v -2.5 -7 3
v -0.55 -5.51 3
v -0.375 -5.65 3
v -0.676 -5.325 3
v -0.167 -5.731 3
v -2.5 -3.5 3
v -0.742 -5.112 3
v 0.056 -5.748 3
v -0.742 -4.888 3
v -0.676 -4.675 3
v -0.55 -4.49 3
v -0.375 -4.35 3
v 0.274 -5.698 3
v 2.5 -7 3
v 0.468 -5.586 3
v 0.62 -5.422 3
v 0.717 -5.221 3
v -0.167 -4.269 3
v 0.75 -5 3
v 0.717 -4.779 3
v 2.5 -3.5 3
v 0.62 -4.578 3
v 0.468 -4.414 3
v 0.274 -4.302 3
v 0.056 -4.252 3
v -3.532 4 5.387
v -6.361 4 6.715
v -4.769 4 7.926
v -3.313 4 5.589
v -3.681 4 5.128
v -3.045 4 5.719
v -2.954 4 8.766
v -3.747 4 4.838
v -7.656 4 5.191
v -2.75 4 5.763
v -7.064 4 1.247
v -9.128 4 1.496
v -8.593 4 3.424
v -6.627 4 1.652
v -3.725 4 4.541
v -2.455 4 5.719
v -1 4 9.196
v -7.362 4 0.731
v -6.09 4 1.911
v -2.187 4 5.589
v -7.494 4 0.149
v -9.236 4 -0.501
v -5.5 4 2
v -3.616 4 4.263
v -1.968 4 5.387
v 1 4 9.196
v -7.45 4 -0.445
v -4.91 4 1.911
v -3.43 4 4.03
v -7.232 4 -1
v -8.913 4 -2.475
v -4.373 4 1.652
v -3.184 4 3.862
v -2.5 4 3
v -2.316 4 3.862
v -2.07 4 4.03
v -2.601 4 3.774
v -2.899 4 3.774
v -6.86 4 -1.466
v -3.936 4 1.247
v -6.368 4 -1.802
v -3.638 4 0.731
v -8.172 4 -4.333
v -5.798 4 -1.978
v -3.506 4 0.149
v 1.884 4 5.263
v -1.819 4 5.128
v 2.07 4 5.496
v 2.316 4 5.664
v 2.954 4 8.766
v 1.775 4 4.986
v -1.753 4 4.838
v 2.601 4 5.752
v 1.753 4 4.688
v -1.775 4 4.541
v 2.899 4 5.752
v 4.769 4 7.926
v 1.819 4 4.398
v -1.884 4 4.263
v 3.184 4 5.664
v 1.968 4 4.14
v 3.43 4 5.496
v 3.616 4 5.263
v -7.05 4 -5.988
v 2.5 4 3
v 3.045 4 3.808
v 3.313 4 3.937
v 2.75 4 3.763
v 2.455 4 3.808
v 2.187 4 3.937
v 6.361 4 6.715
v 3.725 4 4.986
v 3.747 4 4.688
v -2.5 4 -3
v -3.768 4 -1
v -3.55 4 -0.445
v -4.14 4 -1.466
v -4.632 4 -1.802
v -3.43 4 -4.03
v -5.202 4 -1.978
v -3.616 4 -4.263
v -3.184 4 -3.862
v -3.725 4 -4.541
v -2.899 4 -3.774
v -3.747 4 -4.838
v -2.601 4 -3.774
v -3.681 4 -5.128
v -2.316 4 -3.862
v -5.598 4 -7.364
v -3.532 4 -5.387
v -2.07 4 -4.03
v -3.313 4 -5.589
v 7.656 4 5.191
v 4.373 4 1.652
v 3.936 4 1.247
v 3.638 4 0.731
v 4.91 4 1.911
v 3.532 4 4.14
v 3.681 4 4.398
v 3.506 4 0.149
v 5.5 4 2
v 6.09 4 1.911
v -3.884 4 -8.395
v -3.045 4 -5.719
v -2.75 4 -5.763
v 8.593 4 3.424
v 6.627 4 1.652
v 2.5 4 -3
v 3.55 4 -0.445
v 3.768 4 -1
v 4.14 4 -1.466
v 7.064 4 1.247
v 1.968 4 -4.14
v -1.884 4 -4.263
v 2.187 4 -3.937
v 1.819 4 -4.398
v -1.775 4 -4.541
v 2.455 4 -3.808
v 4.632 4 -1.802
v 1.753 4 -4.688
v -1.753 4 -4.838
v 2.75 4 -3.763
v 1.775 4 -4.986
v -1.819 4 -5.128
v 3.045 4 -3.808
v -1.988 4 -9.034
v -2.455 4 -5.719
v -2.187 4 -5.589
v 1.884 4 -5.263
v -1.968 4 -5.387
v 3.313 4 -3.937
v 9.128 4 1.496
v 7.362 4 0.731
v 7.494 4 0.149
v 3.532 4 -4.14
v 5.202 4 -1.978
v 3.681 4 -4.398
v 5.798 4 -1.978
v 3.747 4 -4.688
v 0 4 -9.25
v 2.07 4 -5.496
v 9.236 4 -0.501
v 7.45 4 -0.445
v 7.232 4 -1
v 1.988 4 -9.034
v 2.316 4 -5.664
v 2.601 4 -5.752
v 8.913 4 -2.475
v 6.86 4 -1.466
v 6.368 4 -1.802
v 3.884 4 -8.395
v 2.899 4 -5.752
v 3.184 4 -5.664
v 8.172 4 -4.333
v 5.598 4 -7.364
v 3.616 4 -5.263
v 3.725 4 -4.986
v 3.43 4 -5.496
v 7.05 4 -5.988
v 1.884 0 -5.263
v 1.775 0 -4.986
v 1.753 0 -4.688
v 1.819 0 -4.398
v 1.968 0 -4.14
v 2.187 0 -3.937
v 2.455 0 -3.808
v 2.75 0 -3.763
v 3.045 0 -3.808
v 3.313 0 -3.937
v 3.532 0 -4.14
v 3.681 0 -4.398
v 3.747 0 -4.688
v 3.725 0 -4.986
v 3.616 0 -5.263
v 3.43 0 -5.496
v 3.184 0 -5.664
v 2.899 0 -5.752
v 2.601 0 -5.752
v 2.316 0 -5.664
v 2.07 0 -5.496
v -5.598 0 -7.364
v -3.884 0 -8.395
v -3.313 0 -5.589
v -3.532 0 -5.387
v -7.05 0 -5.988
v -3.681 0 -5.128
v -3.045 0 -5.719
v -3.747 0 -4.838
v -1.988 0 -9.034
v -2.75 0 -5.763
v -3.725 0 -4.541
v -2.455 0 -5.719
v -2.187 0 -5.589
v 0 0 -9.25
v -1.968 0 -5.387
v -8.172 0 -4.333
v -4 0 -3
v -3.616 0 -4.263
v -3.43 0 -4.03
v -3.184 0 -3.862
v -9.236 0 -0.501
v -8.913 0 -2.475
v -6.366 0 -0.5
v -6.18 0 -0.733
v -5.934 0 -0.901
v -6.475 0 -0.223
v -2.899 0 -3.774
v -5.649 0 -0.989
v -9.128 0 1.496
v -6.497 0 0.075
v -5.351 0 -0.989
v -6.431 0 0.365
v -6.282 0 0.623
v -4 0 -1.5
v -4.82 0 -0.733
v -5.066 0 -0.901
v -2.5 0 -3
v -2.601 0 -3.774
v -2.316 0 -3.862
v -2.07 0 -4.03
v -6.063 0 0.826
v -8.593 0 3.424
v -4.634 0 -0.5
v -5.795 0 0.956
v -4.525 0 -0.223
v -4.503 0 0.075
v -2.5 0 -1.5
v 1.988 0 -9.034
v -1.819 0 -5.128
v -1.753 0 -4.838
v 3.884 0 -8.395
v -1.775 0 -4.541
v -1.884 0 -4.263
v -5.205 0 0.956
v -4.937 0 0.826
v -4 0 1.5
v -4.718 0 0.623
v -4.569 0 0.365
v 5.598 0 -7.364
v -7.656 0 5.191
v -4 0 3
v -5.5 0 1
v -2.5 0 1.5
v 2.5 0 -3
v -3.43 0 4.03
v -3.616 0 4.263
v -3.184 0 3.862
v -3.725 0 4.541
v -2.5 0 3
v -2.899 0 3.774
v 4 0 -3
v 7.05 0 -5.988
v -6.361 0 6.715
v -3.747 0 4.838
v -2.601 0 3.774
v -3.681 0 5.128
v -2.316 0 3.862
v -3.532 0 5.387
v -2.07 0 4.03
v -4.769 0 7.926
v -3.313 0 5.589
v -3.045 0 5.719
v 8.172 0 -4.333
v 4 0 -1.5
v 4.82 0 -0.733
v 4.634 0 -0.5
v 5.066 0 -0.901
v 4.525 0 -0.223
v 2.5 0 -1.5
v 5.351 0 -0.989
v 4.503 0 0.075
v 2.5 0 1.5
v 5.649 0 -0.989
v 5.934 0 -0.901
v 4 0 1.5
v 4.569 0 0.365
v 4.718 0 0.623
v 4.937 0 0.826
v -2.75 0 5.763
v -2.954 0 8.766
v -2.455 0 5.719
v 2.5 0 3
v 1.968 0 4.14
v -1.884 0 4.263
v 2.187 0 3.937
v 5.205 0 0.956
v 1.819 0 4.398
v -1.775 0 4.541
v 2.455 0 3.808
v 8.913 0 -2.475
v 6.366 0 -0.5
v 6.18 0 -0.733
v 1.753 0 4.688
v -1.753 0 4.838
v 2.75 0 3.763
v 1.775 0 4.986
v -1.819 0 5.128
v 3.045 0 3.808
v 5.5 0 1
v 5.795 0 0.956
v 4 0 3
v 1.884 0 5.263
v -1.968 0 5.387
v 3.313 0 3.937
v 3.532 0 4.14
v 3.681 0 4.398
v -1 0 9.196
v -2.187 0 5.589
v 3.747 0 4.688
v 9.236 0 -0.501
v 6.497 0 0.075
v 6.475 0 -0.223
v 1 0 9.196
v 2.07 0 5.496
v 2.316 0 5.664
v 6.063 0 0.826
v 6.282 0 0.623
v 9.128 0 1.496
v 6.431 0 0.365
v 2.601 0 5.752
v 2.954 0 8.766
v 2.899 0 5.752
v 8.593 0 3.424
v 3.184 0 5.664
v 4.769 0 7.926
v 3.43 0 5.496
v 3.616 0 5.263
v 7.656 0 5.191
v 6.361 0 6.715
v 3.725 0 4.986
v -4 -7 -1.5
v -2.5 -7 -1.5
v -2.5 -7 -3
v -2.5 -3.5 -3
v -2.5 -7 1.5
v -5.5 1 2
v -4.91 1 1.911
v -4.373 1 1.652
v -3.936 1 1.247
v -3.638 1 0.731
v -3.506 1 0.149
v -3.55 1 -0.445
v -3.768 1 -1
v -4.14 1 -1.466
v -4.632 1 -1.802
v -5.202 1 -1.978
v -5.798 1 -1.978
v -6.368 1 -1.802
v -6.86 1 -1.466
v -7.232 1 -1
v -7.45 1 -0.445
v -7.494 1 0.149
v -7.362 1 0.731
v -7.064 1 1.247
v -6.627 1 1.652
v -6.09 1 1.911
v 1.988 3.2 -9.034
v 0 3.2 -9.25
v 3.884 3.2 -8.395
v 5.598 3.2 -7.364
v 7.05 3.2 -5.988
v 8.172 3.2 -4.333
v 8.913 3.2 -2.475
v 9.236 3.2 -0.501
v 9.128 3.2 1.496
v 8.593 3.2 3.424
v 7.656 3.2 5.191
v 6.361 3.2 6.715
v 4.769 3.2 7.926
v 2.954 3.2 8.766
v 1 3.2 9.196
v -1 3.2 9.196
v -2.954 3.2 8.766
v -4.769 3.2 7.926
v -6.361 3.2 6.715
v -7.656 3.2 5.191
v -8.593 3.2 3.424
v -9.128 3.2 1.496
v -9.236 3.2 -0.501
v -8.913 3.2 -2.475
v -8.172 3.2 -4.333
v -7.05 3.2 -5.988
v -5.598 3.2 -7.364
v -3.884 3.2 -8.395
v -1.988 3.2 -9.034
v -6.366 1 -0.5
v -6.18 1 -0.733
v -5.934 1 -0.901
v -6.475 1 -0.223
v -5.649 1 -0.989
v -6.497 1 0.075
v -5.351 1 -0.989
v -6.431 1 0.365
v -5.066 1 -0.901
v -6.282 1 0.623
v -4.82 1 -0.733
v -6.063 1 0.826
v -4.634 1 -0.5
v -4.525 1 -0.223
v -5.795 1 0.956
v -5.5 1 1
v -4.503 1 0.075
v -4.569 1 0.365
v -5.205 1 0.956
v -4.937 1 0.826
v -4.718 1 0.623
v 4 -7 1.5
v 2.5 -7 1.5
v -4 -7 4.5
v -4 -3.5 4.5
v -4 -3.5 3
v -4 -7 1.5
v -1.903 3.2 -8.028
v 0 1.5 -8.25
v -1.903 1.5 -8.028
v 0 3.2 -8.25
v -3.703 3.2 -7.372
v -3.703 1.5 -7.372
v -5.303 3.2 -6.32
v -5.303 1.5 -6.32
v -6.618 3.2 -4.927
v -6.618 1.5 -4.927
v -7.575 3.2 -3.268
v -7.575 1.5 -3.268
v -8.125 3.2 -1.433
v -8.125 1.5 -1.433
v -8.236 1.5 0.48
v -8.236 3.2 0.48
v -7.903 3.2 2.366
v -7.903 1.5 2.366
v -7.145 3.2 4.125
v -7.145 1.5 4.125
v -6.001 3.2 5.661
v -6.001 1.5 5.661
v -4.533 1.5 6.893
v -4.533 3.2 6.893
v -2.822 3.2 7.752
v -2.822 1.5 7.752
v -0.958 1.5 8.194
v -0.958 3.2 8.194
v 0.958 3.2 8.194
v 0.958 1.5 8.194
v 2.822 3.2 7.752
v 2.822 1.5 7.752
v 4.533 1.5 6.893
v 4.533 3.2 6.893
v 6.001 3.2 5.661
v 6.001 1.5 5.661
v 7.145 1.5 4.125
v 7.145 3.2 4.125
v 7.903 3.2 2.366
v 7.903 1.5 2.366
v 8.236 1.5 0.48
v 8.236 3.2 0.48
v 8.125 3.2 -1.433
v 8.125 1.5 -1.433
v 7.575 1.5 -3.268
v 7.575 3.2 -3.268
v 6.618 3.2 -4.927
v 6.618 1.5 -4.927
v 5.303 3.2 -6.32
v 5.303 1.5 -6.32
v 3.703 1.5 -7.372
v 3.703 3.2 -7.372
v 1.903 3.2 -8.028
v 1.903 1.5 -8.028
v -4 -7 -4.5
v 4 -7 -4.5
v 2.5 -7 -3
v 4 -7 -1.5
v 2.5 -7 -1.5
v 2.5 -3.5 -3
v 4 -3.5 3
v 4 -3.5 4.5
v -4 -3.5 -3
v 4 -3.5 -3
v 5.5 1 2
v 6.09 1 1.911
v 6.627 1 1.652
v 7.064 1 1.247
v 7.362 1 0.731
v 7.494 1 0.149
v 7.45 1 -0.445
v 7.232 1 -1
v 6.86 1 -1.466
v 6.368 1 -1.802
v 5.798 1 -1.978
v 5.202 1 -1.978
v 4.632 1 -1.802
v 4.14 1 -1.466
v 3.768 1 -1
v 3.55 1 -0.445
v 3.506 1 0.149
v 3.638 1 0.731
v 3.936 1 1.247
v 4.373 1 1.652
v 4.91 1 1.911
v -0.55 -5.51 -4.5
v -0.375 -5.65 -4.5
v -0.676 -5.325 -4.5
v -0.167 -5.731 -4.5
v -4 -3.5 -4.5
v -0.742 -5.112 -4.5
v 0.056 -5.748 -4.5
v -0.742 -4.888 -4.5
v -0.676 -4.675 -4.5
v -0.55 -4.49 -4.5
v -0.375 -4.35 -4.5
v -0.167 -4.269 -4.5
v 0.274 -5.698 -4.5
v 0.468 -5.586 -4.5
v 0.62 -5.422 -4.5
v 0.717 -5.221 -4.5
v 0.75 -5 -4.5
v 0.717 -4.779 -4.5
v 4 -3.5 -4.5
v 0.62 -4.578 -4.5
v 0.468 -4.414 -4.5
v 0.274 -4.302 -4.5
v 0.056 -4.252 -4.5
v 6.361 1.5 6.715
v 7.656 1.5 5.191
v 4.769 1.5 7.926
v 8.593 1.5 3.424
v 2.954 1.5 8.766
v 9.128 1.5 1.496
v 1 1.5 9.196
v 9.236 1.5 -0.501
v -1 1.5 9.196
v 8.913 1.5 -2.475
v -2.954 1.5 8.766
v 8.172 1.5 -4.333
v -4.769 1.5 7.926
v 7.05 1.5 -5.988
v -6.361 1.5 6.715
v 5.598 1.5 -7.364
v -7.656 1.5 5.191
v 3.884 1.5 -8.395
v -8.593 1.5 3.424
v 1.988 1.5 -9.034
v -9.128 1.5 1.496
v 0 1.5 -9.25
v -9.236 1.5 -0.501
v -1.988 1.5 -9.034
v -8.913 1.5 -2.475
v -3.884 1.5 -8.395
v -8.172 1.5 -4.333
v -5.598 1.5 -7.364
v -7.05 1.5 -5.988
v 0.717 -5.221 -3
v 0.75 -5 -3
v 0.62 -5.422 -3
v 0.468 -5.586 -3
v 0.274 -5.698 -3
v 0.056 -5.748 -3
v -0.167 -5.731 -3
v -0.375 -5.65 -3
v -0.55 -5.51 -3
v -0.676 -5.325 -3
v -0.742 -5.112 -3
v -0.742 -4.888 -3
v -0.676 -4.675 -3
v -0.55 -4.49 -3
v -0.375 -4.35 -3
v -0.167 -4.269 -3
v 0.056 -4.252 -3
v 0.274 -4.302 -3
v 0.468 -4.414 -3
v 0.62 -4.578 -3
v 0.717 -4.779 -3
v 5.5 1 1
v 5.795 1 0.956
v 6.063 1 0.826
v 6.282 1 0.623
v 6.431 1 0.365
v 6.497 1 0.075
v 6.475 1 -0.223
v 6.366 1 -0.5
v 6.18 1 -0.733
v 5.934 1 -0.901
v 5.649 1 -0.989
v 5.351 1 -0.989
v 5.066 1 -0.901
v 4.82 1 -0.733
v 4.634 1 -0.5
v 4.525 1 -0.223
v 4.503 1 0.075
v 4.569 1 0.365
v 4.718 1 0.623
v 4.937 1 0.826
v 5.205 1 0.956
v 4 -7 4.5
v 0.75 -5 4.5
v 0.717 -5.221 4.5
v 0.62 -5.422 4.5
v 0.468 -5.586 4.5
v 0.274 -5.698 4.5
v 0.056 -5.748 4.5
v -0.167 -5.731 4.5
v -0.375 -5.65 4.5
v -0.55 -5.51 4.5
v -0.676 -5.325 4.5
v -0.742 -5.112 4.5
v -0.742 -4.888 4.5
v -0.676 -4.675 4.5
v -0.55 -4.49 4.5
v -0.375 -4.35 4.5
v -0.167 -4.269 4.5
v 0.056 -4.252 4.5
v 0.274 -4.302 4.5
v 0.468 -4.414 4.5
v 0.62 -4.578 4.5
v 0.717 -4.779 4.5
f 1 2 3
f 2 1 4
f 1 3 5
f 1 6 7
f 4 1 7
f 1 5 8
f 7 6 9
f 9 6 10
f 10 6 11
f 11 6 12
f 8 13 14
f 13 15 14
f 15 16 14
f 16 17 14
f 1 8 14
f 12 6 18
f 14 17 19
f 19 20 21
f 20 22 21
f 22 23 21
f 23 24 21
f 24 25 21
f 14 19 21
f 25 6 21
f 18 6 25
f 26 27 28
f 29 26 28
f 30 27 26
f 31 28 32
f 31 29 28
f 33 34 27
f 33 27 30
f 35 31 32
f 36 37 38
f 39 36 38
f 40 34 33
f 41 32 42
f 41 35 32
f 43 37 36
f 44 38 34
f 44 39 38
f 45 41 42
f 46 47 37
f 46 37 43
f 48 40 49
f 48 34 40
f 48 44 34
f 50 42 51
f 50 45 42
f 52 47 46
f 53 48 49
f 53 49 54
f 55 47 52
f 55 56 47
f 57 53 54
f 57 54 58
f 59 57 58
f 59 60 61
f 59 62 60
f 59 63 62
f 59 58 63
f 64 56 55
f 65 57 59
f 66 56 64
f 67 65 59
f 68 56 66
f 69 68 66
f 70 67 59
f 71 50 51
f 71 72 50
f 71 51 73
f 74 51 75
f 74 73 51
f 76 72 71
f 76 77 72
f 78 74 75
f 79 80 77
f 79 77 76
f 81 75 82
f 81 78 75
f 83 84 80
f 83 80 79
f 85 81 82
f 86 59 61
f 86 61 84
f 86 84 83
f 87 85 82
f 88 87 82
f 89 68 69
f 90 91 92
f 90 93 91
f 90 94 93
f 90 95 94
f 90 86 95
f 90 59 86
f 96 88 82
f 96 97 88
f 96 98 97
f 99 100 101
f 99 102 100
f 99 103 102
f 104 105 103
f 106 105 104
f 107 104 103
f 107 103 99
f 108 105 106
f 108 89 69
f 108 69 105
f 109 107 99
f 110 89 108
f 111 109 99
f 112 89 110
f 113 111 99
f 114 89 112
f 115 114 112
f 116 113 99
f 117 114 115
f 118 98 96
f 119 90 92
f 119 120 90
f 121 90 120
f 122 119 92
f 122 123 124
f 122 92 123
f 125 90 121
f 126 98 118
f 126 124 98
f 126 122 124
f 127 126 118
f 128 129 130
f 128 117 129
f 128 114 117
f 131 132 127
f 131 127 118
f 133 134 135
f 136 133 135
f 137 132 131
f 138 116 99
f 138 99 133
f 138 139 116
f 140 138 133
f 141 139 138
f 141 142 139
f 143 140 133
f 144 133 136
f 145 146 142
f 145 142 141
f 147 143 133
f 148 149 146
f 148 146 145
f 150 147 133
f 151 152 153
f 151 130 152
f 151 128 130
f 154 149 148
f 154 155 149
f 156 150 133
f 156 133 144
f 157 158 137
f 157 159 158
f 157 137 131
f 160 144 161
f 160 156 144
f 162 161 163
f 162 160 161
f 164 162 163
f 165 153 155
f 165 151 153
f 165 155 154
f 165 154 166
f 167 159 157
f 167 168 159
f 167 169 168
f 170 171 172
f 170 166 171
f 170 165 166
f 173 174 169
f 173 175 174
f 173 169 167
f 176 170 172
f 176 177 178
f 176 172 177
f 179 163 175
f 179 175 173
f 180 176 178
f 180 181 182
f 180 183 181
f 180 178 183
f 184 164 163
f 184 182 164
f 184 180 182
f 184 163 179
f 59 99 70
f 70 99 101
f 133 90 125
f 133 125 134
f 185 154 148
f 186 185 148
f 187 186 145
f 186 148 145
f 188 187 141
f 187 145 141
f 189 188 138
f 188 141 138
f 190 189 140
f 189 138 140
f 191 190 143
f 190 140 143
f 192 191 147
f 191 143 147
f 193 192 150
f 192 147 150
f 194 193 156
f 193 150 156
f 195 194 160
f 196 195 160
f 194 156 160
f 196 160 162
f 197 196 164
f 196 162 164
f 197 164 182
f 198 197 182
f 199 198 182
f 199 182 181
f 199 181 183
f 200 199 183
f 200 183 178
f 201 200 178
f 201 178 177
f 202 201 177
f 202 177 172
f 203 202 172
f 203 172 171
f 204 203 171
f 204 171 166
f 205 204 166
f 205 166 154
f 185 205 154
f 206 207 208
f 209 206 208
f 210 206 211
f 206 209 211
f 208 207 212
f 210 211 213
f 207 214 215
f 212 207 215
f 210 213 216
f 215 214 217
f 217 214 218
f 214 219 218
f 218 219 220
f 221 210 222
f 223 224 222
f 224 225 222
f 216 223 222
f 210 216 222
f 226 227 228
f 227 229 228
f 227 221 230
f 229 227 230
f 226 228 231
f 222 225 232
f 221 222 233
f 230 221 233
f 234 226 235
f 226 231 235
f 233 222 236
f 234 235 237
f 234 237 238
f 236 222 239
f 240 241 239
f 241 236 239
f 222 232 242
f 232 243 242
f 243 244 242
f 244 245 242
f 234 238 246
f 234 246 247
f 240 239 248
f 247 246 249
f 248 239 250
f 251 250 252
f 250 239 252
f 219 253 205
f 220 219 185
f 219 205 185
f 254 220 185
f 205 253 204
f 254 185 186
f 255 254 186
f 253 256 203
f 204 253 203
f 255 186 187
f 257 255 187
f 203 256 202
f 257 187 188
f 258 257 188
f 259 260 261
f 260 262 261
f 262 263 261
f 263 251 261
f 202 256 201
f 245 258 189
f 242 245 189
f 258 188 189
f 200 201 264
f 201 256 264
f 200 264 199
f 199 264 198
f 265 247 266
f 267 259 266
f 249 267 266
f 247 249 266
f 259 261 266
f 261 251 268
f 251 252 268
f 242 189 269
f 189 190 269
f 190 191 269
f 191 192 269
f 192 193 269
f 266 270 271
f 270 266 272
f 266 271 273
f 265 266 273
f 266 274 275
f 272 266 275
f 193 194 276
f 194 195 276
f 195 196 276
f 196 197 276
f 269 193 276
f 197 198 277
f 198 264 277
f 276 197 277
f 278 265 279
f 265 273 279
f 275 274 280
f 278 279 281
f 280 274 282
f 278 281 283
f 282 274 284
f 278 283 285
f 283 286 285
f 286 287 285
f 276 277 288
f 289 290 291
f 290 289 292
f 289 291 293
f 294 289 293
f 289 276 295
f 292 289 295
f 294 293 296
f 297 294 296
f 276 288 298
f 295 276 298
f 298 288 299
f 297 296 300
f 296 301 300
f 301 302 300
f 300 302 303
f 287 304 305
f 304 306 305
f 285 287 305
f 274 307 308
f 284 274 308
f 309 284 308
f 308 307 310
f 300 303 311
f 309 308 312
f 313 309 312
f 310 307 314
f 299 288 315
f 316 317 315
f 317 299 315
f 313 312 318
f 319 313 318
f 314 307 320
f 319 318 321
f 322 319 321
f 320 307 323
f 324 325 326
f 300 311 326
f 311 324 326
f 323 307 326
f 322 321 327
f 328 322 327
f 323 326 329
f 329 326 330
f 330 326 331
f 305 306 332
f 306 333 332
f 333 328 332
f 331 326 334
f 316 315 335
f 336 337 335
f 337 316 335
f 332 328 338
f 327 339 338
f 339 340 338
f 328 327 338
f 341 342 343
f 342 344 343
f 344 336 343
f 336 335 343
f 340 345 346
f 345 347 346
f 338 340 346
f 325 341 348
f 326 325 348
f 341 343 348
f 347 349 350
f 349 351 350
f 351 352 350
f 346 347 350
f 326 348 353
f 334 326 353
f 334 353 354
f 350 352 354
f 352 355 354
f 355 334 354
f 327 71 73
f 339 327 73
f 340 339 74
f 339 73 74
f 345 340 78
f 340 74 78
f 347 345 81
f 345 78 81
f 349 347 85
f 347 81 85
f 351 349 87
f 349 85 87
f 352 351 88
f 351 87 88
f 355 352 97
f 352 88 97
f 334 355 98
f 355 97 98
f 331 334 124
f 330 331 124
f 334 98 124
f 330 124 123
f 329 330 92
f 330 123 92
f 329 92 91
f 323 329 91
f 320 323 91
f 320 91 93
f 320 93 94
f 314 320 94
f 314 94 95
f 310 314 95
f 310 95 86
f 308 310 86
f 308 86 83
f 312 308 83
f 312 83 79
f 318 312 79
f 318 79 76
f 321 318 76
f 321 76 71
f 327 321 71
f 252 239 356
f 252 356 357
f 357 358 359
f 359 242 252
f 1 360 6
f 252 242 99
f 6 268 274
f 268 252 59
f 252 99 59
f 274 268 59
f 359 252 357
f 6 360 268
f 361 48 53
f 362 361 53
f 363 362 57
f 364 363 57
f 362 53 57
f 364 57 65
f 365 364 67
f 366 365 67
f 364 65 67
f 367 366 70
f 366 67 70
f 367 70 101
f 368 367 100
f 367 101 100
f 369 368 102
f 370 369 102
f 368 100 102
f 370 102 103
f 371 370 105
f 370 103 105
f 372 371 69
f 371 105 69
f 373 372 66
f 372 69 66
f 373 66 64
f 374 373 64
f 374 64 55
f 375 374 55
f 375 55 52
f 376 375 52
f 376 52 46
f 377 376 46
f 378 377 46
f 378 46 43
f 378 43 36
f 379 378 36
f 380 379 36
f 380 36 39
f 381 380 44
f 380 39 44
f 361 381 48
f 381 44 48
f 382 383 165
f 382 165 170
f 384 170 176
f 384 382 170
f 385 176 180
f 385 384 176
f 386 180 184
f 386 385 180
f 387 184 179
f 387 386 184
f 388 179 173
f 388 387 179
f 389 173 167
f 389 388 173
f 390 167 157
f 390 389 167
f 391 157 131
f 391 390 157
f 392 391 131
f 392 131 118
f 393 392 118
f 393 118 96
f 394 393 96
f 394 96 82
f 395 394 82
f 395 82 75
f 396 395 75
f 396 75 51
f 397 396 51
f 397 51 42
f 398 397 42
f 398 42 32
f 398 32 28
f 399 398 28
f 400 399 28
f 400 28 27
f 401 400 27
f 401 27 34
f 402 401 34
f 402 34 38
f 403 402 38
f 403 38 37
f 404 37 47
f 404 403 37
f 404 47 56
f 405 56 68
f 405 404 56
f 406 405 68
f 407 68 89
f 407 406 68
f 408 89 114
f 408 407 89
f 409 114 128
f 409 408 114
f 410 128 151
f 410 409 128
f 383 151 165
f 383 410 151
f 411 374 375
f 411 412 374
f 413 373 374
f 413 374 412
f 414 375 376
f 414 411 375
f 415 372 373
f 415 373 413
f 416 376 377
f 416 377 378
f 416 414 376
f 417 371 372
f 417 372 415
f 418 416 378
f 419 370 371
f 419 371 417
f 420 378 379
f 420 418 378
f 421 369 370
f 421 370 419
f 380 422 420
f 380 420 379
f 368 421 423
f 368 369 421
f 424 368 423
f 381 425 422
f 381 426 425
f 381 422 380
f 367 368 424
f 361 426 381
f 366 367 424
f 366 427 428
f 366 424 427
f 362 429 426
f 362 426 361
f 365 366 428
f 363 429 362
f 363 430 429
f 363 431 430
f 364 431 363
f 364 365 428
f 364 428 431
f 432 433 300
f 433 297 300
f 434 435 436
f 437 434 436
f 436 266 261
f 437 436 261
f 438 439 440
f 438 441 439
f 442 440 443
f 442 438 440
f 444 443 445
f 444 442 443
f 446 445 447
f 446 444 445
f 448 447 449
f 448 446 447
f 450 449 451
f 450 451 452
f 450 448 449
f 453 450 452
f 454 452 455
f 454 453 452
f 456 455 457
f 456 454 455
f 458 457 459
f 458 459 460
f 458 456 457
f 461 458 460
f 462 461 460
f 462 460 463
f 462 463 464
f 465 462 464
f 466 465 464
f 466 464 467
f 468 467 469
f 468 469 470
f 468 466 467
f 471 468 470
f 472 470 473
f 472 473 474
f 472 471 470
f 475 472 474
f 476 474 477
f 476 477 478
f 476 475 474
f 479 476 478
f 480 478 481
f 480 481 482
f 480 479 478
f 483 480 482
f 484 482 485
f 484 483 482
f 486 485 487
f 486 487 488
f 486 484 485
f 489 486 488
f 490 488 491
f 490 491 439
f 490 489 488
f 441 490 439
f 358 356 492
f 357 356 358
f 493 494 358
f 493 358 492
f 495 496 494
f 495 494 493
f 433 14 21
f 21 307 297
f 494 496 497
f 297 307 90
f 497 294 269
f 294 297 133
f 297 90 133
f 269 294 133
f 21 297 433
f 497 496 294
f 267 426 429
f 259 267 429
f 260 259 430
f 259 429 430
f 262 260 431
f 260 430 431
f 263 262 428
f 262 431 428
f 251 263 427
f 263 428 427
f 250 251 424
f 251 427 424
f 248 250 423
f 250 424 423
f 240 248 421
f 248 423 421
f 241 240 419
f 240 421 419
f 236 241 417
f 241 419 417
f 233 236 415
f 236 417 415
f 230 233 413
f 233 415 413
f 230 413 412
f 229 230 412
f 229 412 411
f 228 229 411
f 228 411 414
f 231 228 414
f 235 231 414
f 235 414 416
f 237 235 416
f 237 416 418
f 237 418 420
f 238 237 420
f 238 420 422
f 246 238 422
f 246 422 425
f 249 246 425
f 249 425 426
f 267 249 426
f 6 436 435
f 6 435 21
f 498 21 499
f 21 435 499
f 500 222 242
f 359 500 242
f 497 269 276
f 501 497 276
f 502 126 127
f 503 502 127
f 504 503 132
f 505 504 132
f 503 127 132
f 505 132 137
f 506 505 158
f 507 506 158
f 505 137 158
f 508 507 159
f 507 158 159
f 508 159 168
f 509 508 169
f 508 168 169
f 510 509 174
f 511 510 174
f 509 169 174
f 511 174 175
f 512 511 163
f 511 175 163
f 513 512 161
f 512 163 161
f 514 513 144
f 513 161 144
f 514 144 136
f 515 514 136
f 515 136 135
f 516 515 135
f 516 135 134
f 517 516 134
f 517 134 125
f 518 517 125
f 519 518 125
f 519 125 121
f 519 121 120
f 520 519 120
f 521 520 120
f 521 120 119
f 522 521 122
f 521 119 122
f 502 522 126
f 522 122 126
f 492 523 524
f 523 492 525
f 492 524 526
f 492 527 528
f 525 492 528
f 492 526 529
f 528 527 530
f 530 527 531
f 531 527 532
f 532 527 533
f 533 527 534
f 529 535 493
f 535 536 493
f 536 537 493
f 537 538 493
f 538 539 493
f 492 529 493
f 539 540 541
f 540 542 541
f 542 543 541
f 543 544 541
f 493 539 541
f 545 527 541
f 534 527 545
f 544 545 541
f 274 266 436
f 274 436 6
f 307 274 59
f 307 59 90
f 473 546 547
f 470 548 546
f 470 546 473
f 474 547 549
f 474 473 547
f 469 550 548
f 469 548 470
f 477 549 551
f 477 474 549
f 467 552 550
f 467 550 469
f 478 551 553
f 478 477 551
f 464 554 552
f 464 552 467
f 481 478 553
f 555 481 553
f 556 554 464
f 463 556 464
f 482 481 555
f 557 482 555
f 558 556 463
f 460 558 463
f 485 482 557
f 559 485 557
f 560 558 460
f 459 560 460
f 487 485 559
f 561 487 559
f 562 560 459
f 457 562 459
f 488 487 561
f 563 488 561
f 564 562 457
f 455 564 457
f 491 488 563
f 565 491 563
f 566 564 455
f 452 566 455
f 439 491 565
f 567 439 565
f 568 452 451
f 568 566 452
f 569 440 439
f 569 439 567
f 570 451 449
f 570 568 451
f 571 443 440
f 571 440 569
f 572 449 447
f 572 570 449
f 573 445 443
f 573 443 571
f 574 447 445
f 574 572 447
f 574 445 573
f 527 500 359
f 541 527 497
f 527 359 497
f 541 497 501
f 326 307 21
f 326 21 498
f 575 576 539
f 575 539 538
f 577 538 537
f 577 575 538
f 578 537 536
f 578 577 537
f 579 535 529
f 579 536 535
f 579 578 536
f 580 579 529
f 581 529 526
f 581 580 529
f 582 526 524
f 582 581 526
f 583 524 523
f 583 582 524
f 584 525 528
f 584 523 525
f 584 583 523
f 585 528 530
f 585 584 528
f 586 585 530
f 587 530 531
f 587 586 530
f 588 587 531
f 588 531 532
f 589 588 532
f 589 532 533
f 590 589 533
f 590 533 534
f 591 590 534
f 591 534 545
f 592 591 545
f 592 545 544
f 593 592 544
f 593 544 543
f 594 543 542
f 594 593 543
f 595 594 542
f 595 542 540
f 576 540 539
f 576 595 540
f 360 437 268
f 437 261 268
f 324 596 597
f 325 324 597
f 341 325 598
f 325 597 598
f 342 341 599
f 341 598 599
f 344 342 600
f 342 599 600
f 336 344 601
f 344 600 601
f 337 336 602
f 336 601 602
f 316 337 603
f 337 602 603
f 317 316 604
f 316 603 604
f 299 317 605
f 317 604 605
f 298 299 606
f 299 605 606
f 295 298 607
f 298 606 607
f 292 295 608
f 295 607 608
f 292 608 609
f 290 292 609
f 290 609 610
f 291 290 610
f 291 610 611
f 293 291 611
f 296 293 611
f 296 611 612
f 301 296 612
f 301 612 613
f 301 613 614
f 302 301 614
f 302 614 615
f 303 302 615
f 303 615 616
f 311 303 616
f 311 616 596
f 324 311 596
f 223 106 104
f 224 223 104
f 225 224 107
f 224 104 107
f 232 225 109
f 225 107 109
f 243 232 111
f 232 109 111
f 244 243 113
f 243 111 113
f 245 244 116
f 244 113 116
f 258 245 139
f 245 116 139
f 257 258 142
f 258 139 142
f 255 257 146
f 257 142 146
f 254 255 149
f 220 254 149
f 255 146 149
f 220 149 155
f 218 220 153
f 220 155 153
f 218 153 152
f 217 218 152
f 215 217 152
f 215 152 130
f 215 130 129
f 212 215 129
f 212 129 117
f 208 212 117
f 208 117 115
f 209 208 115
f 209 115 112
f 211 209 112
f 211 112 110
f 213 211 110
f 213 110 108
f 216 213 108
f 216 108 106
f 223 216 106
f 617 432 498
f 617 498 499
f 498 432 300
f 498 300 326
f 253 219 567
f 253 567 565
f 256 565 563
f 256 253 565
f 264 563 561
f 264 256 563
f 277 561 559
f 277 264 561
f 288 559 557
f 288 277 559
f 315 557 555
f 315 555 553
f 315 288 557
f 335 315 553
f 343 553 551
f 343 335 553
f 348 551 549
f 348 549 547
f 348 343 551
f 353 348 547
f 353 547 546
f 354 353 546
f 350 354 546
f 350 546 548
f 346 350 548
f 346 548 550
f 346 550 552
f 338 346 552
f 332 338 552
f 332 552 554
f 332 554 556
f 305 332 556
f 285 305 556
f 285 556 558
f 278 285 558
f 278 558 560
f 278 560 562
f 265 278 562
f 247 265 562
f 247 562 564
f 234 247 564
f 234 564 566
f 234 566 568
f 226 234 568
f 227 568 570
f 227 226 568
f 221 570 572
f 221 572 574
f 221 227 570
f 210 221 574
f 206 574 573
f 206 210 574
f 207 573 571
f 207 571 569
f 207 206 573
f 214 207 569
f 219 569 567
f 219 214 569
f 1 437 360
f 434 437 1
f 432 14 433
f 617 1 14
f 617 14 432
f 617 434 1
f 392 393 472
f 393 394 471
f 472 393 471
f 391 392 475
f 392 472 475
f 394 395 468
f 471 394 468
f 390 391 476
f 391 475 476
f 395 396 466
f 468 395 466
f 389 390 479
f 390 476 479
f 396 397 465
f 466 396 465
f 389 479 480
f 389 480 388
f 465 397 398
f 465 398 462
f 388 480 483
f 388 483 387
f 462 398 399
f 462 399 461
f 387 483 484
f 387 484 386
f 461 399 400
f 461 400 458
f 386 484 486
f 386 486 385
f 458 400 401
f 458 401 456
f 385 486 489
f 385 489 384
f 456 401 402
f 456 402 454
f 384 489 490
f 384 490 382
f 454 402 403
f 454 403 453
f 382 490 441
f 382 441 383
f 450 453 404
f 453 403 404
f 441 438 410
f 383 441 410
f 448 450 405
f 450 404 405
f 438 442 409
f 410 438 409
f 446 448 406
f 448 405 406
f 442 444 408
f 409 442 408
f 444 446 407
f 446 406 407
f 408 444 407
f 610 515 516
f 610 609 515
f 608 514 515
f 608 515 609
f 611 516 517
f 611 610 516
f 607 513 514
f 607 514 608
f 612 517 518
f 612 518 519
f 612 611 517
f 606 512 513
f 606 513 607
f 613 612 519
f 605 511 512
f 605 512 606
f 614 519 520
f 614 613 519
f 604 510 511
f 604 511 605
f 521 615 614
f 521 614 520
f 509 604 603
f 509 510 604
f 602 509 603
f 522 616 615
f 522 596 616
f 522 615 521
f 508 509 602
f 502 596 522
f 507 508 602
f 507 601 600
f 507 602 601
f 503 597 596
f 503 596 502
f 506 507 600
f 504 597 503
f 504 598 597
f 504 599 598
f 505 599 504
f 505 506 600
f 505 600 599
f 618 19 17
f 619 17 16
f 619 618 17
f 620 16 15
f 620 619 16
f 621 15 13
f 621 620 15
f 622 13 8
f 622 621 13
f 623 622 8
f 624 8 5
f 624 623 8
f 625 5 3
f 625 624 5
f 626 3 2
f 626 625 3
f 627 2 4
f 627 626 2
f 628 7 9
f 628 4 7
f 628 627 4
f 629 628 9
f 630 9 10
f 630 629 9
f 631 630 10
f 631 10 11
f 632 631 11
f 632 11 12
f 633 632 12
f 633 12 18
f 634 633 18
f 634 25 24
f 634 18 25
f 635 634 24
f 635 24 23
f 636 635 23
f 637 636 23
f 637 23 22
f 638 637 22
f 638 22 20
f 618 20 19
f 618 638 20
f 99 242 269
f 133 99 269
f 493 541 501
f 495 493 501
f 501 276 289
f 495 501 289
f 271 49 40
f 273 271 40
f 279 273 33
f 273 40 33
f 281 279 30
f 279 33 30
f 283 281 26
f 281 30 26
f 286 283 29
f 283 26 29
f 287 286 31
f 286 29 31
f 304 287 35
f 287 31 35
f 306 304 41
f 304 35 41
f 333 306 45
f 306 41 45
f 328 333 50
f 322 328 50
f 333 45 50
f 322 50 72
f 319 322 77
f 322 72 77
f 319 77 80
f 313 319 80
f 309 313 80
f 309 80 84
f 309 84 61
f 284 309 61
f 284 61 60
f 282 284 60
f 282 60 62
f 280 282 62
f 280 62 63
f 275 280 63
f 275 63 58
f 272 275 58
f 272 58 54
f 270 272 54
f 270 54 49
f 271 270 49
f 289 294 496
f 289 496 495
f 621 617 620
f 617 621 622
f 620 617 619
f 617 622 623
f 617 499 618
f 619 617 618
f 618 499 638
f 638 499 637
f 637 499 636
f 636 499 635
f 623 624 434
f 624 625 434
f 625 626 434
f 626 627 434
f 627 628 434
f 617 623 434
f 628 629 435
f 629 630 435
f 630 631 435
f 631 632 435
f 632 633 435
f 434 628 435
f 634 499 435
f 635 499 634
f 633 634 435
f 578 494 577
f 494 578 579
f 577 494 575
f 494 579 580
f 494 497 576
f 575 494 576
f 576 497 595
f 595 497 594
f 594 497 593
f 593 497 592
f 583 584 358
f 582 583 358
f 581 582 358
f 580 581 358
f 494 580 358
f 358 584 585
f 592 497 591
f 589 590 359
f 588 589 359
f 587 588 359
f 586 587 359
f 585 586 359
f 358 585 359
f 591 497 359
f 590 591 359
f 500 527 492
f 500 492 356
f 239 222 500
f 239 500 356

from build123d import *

# Parameters (mm, degrees)
SKETCH_1_R               = 11
EXTRUDE_1_DEPTH          = 9
SKETCH_2_R               = 1
CUT_EXTRUDE_1_DEPTH      = 10
SKETCH_3_R               = 16.549134696
SKETCH_3_R_2             = 9.25
CUT_EXTRUDE_2_DEPTH      = 7
SKETCH_4_W               = 2
SKETCH_4_H               = 1.7
SKETCH_5_W               = 5
SKETCH_5_H               = 6
CUT_EXTRUDE_3_DEPTH      = 7
SKETCH_6_R               = 1.4
CUT_EXTRUDE_4_DEPTH      = 7
PATTERN_CIRCULAR_1_COUNT = 3
PATTERN_CIRCULAR_1_ANGLE = 120
SKETCH_10_R              = 17.755262973
CUT_EXTRUDE_8_DEPTH      = 5
SKETCH_11_R              = 2
CUT_EXTRUDE_9_DEPTH      = 3
SKETCH_12_W              = 1.5
SKETCH_12_H              = 1.5
EXTRUDE_2_DEPTH          = 3.5
SKETCH_14_W              = 1.5
SKETCH_14_H              = 1.5
EXTRUDE_3_DEPTH          = 3.5
SKETCH_13_R              = 0.75
CUT_EXTRUDE_11_DEPTH     = 18.989580318


with BuildPart() as part:
    # 草图1 → 凸台-拉伸1 (new body)
    with BuildSketch(Plane(origin=(0, 0, 0), x_dir=(1, 0, 0), z_dir=(0, 1, 0))):
        with Locations(Location((0, 0, 0), (0, 0, 270))):
            Circle(SKETCH_1_R)
    extrude(amount=EXTRUDE_1_DEPTH)

    # 草图2 → 切除-拉伸1 (cut)
    with BuildSketch(Plane(origin=(0, 9, 0), x_dir=(1, 0, 0), z_dir=(0, 1, 0))):
        with Locations(Location((-5.5, 0, 0), (0, 0, 270))):
            Circle(SKETCH_2_R)
        with Locations(Location((5.5, 0, 0), (0, 0, 270))):
            Circle(SKETCH_2_R)
    cut_extrude_1 = extrude(amount=-CUT_EXTRUDE_1_DEPTH, mode=Mode.SUBTRACT)

    # 草图3 → 切除-拉伸2 (cut)
    with BuildSketch(Plane.XZ):
        Circle(SKETCH_3_R)
        with Locations(Location((0, 0, 0), (0, 0, 270))):
            Circle(SKETCH_3_R_2, mode=Mode.SUBTRACT)
    extrude(amount=-CUT_EXTRUDE_2_DEPTH, mode=Mode.SUBTRACT)

    # 草图4 → 切除-旋转1 (revolve, cut)
    with BuildSketch(Plane.XY, mode=Mode.PRIVATE) as cut_revolve_1_sk:
        with Locations((-9.25, 5.45)):
            Rectangle(SKETCH_4_W, SKETCH_4_H)
        with Locations((-9.25, 2.35)):
            Rectangle(SKETCH_4_W, SKETCH_4_H)
    revolve(cut_revolve_1_sk.sketch.rotate(Axis((0, 0, 0), (0, 1, 0)), 270), axis=Axis((0, 0, 0), (0, 1, 0)), mode=Mode.SUBTRACT)

    # 草图5 → 切除-拉伸3 (cut)
    with BuildSketch(Plane.XZ):
        Rectangle(SKETCH_5_W, SKETCH_5_H)
    extrude(amount=-CUT_EXTRUDE_3_DEPTH, mode=Mode.SUBTRACT)

    # 草图6 → 切除-拉伸4 (cut)
    with BuildSketch(Plane(origin=(0, 9, 0), x_dir=(1, 0, 0), z_dir=(0, 1, 0))):
        with Locations(Location((0, 0, 0), (0, 0, 270))):
            Circle(SKETCH_6_R)
    extrude(amount=-CUT_EXTRUDE_4_DEPTH, mode=Mode.SUBTRACT)

    # 阵列(圆周)1: 切除-拉伸1 ×3 about axis
    pattern_circular_1_axis = Axis((0, 0, 0), (0, -1, 0))
    for i in range(1, PATTERN_CIRCULAR_1_COUNT):
        add(cut_extrude_1.rotate(pattern_circular_1_axis, i * PATTERN_CIRCULAR_1_ANGLE / (PATTERN_CIRCULAR_1_COUNT - 1)), mode=Mode.SUBTRACT)

    # 草图10 → 切除-拉伸8 (cut)
    with BuildSketch(Plane(origin=(0, 9, 0), x_dir=(1, 0, 0), z_dir=(0, 1, 0))):
        Circle(SKETCH_10_R)
    extrude(amount=-CUT_EXTRUDE_8_DEPTH, mode=Mode.SUBTRACT)

    # 草图11 → 切除-拉伸9 (cut)
    with BuildSketch(Plane(origin=(0, 4, 0), x_dir=(1, 0, 0), z_dir=(0, 1, 0))):
        with Locations(Location((-5.5, 0, 0), (0, 0, 270))):
            Circle(SKETCH_11_R)
        with Locations(Location((5.5, 0, 0), (0, 0, 270))):
            Circle(SKETCH_11_R)
    extrude(amount=-CUT_EXTRUDE_9_DEPTH, mode=Mode.SUBTRACT)

    # 草图12 → 凸台-拉伸2 (add)
    with BuildSketch(Plane.XZ):
        with Locations((-3.25, 2.25)):
            Rectangle(SKETCH_12_W, SKETCH_12_H)
        with Locations((3.25, 2.25)):
            Rectangle(SKETCH_12_W, SKETCH_12_H)
        with Locations((3.25, -2.25)):
            Rectangle(SKETCH_12_W, SKETCH_12_H)
        with Locations((-3.25, -2.25)):
            Rectangle(SKETCH_12_W, SKETCH_12_H)
    extrude(amount=EXTRUDE_2_DEPTH)

    # 草图14 → 凸台-拉伸3 (add)
    with BuildSketch(Plane.XZ.offset(3.5)):
        Polygon((-4, 4.5), (-4, 3), (-2.5, 3), (2.5, 3), (2.5, 1.5), (4, 1.5), (4, 4.5), align=None)
        with Locations((-3.25, 2.25)):
            Rectangle(SKETCH_14_W, SKETCH_14_H)
        Polygon((-2.5, -3), (-2.5, -1.5), (-4, -1.5), (-4, -4.5), (4, -4.5), (4, -1.5), (2.5, -1.5), (2.5, -3), align=None)
    extrude(amount=EXTRUDE_3_DEPTH)

    # 草图13 → 切除-拉伸11 (cut, through all)
    with BuildSketch(Plane(origin=(0, 0, 4.5), x_dir=(-1, 0, 0), z_dir=(0, 0, -1))):
        with Locations(Location((0, -5, 0), (0, 0, 180))):
            Circle(SKETCH_13_R)
    extrude(amount=CUT_EXTRUDE_11_DEPTH, mode=Mode.SUBTRACT)


solid = part.part
